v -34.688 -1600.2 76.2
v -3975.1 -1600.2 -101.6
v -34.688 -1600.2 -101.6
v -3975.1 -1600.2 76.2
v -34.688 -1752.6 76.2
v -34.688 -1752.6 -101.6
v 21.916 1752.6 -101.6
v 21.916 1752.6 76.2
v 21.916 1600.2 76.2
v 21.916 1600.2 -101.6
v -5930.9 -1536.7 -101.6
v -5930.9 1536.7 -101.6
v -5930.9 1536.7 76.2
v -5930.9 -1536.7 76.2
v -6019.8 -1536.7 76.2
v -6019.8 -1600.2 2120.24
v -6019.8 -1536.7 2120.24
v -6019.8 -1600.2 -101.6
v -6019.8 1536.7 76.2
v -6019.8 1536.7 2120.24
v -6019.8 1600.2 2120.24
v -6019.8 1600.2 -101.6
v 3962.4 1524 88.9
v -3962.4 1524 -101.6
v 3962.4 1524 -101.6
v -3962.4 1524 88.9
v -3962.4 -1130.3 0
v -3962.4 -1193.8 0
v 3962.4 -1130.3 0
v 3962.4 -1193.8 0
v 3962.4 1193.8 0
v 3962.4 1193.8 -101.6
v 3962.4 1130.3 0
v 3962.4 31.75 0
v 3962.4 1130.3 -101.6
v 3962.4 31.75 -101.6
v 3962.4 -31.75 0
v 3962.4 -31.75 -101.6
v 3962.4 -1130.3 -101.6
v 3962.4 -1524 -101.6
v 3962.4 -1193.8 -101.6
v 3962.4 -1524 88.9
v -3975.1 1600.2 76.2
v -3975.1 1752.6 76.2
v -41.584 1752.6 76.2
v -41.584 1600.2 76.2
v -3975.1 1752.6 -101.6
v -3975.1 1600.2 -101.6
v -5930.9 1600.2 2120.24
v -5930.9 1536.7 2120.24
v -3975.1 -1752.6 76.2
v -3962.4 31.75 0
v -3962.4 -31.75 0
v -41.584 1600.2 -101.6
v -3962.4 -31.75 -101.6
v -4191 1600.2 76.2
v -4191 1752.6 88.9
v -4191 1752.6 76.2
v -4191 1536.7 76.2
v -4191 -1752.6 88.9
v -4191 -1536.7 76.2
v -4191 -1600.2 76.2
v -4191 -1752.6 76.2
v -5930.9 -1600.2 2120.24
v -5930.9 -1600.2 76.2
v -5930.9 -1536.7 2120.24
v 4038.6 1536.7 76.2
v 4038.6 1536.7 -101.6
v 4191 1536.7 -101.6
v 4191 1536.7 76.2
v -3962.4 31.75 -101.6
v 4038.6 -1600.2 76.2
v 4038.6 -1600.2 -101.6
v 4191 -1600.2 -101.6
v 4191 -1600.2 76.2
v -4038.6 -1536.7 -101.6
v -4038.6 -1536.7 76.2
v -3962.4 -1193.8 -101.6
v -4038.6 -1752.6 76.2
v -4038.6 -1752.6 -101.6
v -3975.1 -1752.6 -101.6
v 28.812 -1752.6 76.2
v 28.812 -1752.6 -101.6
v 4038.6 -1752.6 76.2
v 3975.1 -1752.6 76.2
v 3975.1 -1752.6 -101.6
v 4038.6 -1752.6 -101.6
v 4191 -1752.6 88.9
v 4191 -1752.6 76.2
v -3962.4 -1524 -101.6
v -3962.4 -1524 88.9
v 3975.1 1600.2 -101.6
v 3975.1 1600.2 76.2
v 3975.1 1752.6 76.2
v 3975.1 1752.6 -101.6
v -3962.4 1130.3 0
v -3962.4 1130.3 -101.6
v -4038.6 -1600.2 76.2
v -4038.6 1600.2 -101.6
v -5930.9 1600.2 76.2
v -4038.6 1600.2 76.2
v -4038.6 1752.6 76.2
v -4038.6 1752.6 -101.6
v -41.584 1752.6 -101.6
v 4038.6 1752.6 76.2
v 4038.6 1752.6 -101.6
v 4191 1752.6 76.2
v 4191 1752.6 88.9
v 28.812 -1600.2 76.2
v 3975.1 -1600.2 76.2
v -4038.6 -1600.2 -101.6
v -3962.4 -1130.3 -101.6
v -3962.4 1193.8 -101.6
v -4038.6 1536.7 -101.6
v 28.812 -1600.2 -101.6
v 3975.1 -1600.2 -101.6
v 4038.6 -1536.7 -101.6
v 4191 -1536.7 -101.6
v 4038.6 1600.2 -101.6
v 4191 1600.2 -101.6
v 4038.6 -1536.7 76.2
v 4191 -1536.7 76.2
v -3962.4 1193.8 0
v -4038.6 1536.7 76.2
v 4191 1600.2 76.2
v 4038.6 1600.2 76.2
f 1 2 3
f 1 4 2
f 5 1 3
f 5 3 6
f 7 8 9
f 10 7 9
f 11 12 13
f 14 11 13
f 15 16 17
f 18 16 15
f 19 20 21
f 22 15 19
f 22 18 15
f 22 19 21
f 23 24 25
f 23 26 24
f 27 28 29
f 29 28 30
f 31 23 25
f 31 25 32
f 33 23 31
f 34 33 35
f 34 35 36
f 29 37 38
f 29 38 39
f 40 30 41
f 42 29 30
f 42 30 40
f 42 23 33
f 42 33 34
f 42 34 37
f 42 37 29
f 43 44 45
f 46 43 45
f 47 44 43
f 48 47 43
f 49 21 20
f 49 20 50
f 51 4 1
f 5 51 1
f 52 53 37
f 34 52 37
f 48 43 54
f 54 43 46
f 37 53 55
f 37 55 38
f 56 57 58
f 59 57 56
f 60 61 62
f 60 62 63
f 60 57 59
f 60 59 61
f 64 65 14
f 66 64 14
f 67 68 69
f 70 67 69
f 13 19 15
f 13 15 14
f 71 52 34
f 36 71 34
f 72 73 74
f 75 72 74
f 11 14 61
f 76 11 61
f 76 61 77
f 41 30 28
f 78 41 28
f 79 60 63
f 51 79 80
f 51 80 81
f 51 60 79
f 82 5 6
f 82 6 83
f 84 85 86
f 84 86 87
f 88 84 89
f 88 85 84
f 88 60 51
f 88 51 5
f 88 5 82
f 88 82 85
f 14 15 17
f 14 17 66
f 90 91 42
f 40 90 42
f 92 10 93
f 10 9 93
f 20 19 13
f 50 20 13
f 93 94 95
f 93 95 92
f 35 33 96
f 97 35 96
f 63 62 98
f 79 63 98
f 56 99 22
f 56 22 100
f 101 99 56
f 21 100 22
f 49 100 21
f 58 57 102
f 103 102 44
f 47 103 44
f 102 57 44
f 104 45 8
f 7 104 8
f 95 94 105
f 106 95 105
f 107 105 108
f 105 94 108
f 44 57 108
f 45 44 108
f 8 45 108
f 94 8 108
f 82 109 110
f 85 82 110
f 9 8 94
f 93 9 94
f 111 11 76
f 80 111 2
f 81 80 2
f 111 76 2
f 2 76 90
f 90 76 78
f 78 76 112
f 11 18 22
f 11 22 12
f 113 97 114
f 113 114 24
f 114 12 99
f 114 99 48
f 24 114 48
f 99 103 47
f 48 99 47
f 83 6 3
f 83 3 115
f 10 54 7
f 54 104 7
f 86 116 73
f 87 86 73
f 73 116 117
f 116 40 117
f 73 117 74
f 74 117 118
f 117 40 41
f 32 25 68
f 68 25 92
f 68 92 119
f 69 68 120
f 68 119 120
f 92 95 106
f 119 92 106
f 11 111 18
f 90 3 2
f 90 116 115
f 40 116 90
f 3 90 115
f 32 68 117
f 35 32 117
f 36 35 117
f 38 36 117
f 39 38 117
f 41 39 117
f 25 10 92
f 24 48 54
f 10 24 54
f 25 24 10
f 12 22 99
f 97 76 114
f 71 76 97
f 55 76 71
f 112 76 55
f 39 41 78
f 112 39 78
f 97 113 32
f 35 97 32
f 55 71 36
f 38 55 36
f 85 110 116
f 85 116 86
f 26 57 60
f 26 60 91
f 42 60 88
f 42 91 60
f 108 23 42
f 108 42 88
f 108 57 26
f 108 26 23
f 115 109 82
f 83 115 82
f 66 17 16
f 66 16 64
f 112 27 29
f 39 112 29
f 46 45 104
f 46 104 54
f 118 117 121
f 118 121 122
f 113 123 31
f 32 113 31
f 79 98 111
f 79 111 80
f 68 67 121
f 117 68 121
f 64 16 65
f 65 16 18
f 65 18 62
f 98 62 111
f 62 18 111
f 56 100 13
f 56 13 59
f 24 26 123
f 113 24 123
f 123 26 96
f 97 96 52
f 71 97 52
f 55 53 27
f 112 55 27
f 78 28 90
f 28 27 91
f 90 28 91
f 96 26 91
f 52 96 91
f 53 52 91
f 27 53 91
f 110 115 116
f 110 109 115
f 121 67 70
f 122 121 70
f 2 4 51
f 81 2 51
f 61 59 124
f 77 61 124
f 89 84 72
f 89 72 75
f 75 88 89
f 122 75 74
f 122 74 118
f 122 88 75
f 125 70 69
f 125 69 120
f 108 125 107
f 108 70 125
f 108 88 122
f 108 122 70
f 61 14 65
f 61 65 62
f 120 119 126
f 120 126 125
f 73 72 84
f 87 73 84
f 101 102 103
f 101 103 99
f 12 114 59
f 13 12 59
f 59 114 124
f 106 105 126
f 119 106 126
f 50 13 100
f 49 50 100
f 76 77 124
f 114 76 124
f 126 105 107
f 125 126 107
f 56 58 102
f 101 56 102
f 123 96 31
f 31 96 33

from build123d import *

# Parameters (mm, degrees)
F0_W      = 8077.2
F0_H      = 3200.4
F0_W_2    = 7924.8
F0_H_2    = 3048
F1_DEPTH  = 88.9
F2_W      = 8382
F2_H      = 3505.2
F2_W_2    = 8077.2
F2_H_2    = 3200.4
F3_DEPTH  = 12.7
F4_W      = 76.2
F4_H      = 63.5
F4_H_2    = 406.4
F4_W_2    = 7924.8
F4_H_3    = 1098.55
F5_DEPTH  = 101.6
F6_W      = 7924.8
F6_H      = 76.2
F7_DEPTH  = 101.6
F8_W      = 7924.8
F8_H      = 76.2
F9_DEPTH  = 101.6
F10_W     = 63.5
F10_H     = 152.4
F10_W_2   = 152.4
F10_H_2   = 63.5
F11_DEPTH = 177.8
F12_W     = 63.5
F12_H     = 177.8
F13_DEPTH = 1828.8
F14_W     = 88.9
F14_H     = 177.8
F15_DEPTH = 3103.88
F16_W     = 88.9
F16_H     = 63.5
F17_DEPTH = 2044.0396


with BuildPart() as f1:
    # F0 (on Top) → F1 (new body)
    with BuildSketch(Plane.XY):
        Rectangle(F0_W, F0_H)
        Rectangle(F0_W_2, F0_H_2, mode=Mode.SUBTRACT)
    extrude(amount=F1_DEPTH)

    # F2 (on face) → F3 (join)
    with BuildSketch(Plane.XY.offset(88.9)):
        Rectangle(F2_W, F2_H)
        Rectangle(F2_W_2, F2_H_2, mode=Mode.SUBTRACT)
    extrude(amount=-F3_DEPTH)

    # F4 (on face) → F5 (join)
    with BuildSketch(Plane(origin=(0, 0, 0), x_dir=(1, 0, 0), z_dir=(0, 0, -1))):
        with Locations((-4000.5, -1162.05)):
            Rectangle(F4_W, F4_H)
        with Locations((-4000.5, -1397)):
            Rectangle(F4_W, F4_H_2)
        with Locations((0, -1162.05)):
            Rectangle(F4_W_2, F4_H)
        with Locations((-4000.5, -581.025)):
            Rectangle(F4_W, F4_H_3)
        with Locations((4000.5, -1162.05)):
            Rectangle(F4_W, F4_H)
        with Locations((4000.5, -1397)):
            Rectangle(F4_W, F4_H_2)
        with Locations((-4000.5, 0)):
            Rectangle(F4_W, F4_H)
        with Locations((4000.5, -581.025)):
            Rectangle(F4_W, F4_H_3)
        with Locations((-4000.5, 581.025)):
            Rectangle(F4_W, F4_H_3)
        with Locations((4000.5, 0)):
            Rectangle(F4_W, F4_H)
        with Locations((-4000.5, 1162.05)):
            Rectangle(F4_W, F4_H)
        with Locations((4000.5, 581.025)):
            Rectangle(F4_W, F4_H_3)
        with Locations((0, 1162.05)):
            Rectangle(F4_W_2, F4_H)
        with Locations((-4000.5, 1397)):
            Rectangle(F4_W, F4_H_2)
        with Locations((4000.5, 1162.05)):
            Rectangle(F4_W, F4_H)
        with Locations((4000.5, 1397)):
            Rectangle(F4_W, F4_H_2)
        Rectangle(F4_W_2, F4_H)
    extrude(amount=F5_DEPTH)

    # F6 (on face) → F7 (join)
    with BuildSketch(Plane(origin=(0, 0, 0), x_dir=(1, 0, 0), z_dir=(0, 0, -1))):
        with Locations((0, -1562.1)):
            Rectangle(F6_W, F6_H)
    extrude(amount=F7_DEPTH)

    # F8 (on face) → F9 (join)
    with BuildSketch(Plane(origin=(0, 0, 0), x_dir=(1, 0, 0), z_dir=(0, 0, -1))):
        with Locations((0, 1562.1)):
            Rectangle(F8_W, F8_H)
    extrude(amount=F9_DEPTH)

    # F10 (on face) → F11 (join)
    with BuildSketch(Plane(origin=(0, 0, 76.2), x_dir=(1, 0, 0), z_dir=(0, 0, -1))):
        with Locations((-4006.85, 1676.4)):
            Rectangle(F10_W, F10_H)
        with Locations((-4114.8, 1568.45)):
            Rectangle(F10_W_2, F10_H_2)
        with Locations((-2.9379549325, 1676.4)):
            Rectangle(F10_W, F10_H)
        with Locations((4006.85, 1676.4)):
            Rectangle(F10_W, F10_H)
        with Locations((4114.8, 1568.45)):
            Rectangle(F10_W_2, F10_H_2)
        with Locations((4114.8, -1568.45)):
            Rectangle(F10_W_2, F10_H_2)
        with Locations((4006.85, -1676.4)):
            Rectangle(F10_W, F10_H)
        with Locations((-4006.85, -1676.4)):
            Rectangle(F10_W, F10_H)
        with Locations((-4114.8, -1568.45)):
            Rectangle(F10_W_2, F10_H_2)
        with Locations((-9.8344060481, -1676.4)):
            Rectangle(F10_W, F10_H)
    extrude(amount=F11_DEPTH)

    # F12 (on face) → F13 (join)
    with BuildSketch(Plane(origin=(-4191, 0, 0), x_dir=(0, -1, 0), z_dir=(-1, 0, 0))):
        with Locations((-1568.45, -12.7)):
            Rectangle(F12_W, F12_H)
        with Locations((1568.45, -12.7)):
            Rectangle(F12_W, F12_H)
    extrude(amount=F13_DEPTH)

    # F14 (on face) → F15 (join)
    with BuildSketch(Plane.XZ.offset(-1536.7)):
        with Locations((-5975.35, -12.7)):
            Rectangle(F14_W, F14_H)
    extrude(amount=F15_DEPTH)

    # F16 (on face) → F17 (join)
    with BuildSketch(Plane.XY.offset(76.2)):
        with Locations((-5975.35, -1568.45)):
            Rectangle(F16_W, F16_H)
        with Locations((-5975.35, 1568.45)):
            Rectangle(F16_W, F16_H)
    extrude(amount=F17_DEPTH)


solid = f1.part
